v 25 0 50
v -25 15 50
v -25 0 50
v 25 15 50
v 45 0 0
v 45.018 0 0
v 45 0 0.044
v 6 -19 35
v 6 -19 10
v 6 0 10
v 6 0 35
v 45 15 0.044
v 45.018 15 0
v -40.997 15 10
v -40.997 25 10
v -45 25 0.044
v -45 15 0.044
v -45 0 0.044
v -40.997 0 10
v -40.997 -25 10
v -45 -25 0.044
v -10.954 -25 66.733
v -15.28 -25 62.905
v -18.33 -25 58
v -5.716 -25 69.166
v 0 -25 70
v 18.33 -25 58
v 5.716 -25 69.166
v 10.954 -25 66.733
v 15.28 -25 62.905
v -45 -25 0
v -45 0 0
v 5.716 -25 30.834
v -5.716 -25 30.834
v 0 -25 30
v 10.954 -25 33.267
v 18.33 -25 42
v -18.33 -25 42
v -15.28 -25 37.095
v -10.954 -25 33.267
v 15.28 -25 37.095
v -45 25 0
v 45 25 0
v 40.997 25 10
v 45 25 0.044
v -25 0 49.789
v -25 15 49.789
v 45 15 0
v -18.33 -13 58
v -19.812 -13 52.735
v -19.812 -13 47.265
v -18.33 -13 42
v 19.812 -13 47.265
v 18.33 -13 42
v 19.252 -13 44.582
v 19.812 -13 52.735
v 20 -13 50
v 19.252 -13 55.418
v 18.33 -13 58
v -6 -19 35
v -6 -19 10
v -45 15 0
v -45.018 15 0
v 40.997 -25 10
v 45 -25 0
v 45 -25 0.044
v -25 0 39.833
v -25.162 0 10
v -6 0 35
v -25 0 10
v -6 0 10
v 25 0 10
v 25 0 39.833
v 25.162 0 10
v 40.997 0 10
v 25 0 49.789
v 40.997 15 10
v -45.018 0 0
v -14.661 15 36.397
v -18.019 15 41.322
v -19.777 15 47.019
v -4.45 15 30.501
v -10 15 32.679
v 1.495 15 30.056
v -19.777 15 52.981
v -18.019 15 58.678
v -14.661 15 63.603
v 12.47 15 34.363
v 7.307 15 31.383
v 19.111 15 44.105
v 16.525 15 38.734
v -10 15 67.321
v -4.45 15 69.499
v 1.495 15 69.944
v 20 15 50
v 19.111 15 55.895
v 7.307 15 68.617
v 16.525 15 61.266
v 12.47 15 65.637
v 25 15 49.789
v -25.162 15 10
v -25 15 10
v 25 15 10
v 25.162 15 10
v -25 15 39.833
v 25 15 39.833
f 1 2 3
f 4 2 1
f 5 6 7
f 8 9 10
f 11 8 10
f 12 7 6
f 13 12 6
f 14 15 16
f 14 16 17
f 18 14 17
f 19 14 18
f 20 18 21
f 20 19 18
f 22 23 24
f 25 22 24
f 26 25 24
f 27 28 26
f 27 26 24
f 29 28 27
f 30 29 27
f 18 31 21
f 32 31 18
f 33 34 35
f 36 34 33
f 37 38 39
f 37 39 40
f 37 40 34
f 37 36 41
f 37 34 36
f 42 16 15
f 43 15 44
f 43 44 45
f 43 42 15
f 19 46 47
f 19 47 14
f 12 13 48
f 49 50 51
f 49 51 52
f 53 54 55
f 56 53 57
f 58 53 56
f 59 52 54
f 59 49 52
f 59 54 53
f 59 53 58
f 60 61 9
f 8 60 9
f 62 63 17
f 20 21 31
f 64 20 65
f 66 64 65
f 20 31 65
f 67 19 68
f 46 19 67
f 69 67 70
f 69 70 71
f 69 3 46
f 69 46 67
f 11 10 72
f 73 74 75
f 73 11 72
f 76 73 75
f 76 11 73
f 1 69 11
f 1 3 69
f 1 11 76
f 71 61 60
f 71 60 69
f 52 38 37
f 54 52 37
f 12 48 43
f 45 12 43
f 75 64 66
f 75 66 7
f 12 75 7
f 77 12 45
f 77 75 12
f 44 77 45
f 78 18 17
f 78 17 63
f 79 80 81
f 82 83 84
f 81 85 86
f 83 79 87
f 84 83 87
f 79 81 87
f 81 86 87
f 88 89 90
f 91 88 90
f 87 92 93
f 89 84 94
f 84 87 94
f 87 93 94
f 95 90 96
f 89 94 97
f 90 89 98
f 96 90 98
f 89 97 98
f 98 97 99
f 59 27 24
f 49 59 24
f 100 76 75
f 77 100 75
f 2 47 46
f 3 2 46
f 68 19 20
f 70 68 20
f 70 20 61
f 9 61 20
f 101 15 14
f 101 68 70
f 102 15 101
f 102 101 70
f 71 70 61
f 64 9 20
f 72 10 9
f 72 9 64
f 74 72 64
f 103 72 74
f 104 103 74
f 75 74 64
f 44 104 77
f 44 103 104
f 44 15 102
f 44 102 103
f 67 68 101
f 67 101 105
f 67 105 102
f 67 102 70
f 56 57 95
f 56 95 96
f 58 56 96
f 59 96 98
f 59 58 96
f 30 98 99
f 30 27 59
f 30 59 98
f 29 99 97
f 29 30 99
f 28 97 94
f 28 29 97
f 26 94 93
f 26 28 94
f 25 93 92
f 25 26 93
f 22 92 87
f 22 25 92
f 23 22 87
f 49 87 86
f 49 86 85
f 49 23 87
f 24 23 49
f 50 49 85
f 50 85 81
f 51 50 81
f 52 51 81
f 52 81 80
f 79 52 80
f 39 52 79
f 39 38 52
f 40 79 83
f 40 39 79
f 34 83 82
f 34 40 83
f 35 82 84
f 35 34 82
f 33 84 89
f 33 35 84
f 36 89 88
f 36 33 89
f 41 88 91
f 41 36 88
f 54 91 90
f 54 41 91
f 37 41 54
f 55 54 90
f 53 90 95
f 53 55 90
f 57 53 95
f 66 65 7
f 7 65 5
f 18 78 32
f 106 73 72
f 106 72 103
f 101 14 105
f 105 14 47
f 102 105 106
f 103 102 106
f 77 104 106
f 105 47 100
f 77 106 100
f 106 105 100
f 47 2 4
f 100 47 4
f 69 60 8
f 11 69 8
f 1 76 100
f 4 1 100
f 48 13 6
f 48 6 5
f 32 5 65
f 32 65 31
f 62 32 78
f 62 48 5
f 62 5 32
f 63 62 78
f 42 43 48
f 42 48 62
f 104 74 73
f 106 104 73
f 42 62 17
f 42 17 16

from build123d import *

# Parameters (mm, degrees)
F0_W      = 90
F0_H      = 50
F1_DEPTH  = 10
F2_R      = 20
F3_DEPTH  = 40
F5_DEPTH  = 12
F6_W      = 12
F6_H      = 19
F7_DEPTH  = 25
F9_DEPTH  = 40
F11_DEPTH = 15
F14_DEPTH = 10
F16_DEPTH = 25


with BuildPart() as f1:
    # F0 (on Top) → F1 (new body)
    with BuildSketch(Plane.XY):
        Rectangle(F0_W, F0_H)
    extrude(amount=F1_DEPTH)

    # F6 (on face) → F7 (join)
    with BuildSketch(Plane.XY.offset(10)):
        with Locations((0, -9.5)):
            Rectangle(F6_W, F6_H)
    extrude(amount=F7_DEPTH)

    # F8 (on face) → F9 (join)
    with BuildSketch(Plane.XY.offset(10)):
        Polygon((6, 0), (25, 0), (25, 15), (-25, 15), (-25, 0), (-6, 0), align=None)
    extrude(amount=F9_DEPTH)

    # F10 (on Front) → F11 (join)
    with BuildSketch(Plane.XZ):
        Polygon((-25.21645464, 0), (-24.9451585114, 49.9252006412), (-45.0175479054, 0), align=None)
    extrude(amount=-F11_DEPTH)

    # F12: F1 across plane


with BuildPart() as f3:
    # F2 (on face) → F3 (new body)
    with BuildSketch(Plane.XZ.offset(25)):
        with Locations((0, 50)):
            Circle(F2_R)
    extrude(amount=-F3_DEPTH)

    # F4 (on face) → F5 (cut)
    with BuildSketch(Plane.XZ.offset(25)):
        with BuildLine():
            ThreePointArc((20, 50), (19.5781262586, 45.9138071262), (18.3303027798, 42))
            Line((18.3303027798, 42), (38.403568727, 42))
            Line((38.403568727, 42), (38.403568727, 58))
            Line((38.403568727, 58), (18.3303027798, 58))
            ThreePointArc((18.3303027798, 58), (19.5781262586, 54.0861928738), (20, 50))
        make_face()
        with BuildLine():
            Line((-38.403568727, 58), (-38.403568727, 42))
            Line((-38.403568727, 42), (-18.3303027798, 42))
            ThreePointArc((-18.3303027798, 42), (-20, 50), (-18.3303027798, 58))
            Line((-18.3303027798, 58), (-38.403568727, 58))
        make_face()
        with BuildLine():
            ThreePointArc((-18.3303027798, 58), (-20, 50), (-18.3303027798, 42))
            Line((-18.3303027798, 42), (18.3303027798, 42))
            ThreePointArc((18.3303027798, 42), (19.5781262586, 45.9138071262), (20, 50))
            ThreePointArc((20, 50), (19.5781262586, 54.0861928738), (18.3303027798, 58))
            Line((18.3303027798, 58), (-18.3303027798, 58))
        make_face()
    extrude(amount=-F5_DEPTH, mode=Mode.SUBTRACT)


with BuildPart() as f1_1:
    add(f1.part)
    add(f1.part.mirror(Plane.YZ))

    # F13 (on face) → F14 (cut)
    with BuildSketch(Plane(origin=(-38.7533215674, 0, 15.5807438092), x_dir=(0, -1, 0), z_dir=(-0.9278196121, 0, 0.3730291777))):
        Polygon((33.9928641915, -19.423213931), (33.9928641915, 7.3934104294), (0, 7.3934104294), (0, -6.0149017508), (-15, -6.0149017508), (-15, 7.3934104294), (-48.9928641915, 7.3934104294), (-48.9928641915, -19.423213931), align=None)
    extrude(amount=F14_DEPTH, mode=Mode.SUBTRACT)

    # F15 (on face) → F16 (cut)
    with BuildSketch(Plane(origin=(38.7533215674, 0, 15.5807438092), x_dir=(0, 1, 0), z_dir=(0.9278196121, 0, 0.3730291777))):
        Polygon((0, 9.3338117003), (-31.8076275289, 9.3338117003), (-31.8076275289, -21.363615202), (46.8076275289, -21.363615202), (46.8076275289, 9.3338117003), (15, 9.3338117003), (15, -6.0149017508), (0, -6.0149017508), align=None)
    extrude(amount=F16_DEPTH, mode=Mode.SUBTRACT)


solid = Compound([f3.part, f1_1.part])
